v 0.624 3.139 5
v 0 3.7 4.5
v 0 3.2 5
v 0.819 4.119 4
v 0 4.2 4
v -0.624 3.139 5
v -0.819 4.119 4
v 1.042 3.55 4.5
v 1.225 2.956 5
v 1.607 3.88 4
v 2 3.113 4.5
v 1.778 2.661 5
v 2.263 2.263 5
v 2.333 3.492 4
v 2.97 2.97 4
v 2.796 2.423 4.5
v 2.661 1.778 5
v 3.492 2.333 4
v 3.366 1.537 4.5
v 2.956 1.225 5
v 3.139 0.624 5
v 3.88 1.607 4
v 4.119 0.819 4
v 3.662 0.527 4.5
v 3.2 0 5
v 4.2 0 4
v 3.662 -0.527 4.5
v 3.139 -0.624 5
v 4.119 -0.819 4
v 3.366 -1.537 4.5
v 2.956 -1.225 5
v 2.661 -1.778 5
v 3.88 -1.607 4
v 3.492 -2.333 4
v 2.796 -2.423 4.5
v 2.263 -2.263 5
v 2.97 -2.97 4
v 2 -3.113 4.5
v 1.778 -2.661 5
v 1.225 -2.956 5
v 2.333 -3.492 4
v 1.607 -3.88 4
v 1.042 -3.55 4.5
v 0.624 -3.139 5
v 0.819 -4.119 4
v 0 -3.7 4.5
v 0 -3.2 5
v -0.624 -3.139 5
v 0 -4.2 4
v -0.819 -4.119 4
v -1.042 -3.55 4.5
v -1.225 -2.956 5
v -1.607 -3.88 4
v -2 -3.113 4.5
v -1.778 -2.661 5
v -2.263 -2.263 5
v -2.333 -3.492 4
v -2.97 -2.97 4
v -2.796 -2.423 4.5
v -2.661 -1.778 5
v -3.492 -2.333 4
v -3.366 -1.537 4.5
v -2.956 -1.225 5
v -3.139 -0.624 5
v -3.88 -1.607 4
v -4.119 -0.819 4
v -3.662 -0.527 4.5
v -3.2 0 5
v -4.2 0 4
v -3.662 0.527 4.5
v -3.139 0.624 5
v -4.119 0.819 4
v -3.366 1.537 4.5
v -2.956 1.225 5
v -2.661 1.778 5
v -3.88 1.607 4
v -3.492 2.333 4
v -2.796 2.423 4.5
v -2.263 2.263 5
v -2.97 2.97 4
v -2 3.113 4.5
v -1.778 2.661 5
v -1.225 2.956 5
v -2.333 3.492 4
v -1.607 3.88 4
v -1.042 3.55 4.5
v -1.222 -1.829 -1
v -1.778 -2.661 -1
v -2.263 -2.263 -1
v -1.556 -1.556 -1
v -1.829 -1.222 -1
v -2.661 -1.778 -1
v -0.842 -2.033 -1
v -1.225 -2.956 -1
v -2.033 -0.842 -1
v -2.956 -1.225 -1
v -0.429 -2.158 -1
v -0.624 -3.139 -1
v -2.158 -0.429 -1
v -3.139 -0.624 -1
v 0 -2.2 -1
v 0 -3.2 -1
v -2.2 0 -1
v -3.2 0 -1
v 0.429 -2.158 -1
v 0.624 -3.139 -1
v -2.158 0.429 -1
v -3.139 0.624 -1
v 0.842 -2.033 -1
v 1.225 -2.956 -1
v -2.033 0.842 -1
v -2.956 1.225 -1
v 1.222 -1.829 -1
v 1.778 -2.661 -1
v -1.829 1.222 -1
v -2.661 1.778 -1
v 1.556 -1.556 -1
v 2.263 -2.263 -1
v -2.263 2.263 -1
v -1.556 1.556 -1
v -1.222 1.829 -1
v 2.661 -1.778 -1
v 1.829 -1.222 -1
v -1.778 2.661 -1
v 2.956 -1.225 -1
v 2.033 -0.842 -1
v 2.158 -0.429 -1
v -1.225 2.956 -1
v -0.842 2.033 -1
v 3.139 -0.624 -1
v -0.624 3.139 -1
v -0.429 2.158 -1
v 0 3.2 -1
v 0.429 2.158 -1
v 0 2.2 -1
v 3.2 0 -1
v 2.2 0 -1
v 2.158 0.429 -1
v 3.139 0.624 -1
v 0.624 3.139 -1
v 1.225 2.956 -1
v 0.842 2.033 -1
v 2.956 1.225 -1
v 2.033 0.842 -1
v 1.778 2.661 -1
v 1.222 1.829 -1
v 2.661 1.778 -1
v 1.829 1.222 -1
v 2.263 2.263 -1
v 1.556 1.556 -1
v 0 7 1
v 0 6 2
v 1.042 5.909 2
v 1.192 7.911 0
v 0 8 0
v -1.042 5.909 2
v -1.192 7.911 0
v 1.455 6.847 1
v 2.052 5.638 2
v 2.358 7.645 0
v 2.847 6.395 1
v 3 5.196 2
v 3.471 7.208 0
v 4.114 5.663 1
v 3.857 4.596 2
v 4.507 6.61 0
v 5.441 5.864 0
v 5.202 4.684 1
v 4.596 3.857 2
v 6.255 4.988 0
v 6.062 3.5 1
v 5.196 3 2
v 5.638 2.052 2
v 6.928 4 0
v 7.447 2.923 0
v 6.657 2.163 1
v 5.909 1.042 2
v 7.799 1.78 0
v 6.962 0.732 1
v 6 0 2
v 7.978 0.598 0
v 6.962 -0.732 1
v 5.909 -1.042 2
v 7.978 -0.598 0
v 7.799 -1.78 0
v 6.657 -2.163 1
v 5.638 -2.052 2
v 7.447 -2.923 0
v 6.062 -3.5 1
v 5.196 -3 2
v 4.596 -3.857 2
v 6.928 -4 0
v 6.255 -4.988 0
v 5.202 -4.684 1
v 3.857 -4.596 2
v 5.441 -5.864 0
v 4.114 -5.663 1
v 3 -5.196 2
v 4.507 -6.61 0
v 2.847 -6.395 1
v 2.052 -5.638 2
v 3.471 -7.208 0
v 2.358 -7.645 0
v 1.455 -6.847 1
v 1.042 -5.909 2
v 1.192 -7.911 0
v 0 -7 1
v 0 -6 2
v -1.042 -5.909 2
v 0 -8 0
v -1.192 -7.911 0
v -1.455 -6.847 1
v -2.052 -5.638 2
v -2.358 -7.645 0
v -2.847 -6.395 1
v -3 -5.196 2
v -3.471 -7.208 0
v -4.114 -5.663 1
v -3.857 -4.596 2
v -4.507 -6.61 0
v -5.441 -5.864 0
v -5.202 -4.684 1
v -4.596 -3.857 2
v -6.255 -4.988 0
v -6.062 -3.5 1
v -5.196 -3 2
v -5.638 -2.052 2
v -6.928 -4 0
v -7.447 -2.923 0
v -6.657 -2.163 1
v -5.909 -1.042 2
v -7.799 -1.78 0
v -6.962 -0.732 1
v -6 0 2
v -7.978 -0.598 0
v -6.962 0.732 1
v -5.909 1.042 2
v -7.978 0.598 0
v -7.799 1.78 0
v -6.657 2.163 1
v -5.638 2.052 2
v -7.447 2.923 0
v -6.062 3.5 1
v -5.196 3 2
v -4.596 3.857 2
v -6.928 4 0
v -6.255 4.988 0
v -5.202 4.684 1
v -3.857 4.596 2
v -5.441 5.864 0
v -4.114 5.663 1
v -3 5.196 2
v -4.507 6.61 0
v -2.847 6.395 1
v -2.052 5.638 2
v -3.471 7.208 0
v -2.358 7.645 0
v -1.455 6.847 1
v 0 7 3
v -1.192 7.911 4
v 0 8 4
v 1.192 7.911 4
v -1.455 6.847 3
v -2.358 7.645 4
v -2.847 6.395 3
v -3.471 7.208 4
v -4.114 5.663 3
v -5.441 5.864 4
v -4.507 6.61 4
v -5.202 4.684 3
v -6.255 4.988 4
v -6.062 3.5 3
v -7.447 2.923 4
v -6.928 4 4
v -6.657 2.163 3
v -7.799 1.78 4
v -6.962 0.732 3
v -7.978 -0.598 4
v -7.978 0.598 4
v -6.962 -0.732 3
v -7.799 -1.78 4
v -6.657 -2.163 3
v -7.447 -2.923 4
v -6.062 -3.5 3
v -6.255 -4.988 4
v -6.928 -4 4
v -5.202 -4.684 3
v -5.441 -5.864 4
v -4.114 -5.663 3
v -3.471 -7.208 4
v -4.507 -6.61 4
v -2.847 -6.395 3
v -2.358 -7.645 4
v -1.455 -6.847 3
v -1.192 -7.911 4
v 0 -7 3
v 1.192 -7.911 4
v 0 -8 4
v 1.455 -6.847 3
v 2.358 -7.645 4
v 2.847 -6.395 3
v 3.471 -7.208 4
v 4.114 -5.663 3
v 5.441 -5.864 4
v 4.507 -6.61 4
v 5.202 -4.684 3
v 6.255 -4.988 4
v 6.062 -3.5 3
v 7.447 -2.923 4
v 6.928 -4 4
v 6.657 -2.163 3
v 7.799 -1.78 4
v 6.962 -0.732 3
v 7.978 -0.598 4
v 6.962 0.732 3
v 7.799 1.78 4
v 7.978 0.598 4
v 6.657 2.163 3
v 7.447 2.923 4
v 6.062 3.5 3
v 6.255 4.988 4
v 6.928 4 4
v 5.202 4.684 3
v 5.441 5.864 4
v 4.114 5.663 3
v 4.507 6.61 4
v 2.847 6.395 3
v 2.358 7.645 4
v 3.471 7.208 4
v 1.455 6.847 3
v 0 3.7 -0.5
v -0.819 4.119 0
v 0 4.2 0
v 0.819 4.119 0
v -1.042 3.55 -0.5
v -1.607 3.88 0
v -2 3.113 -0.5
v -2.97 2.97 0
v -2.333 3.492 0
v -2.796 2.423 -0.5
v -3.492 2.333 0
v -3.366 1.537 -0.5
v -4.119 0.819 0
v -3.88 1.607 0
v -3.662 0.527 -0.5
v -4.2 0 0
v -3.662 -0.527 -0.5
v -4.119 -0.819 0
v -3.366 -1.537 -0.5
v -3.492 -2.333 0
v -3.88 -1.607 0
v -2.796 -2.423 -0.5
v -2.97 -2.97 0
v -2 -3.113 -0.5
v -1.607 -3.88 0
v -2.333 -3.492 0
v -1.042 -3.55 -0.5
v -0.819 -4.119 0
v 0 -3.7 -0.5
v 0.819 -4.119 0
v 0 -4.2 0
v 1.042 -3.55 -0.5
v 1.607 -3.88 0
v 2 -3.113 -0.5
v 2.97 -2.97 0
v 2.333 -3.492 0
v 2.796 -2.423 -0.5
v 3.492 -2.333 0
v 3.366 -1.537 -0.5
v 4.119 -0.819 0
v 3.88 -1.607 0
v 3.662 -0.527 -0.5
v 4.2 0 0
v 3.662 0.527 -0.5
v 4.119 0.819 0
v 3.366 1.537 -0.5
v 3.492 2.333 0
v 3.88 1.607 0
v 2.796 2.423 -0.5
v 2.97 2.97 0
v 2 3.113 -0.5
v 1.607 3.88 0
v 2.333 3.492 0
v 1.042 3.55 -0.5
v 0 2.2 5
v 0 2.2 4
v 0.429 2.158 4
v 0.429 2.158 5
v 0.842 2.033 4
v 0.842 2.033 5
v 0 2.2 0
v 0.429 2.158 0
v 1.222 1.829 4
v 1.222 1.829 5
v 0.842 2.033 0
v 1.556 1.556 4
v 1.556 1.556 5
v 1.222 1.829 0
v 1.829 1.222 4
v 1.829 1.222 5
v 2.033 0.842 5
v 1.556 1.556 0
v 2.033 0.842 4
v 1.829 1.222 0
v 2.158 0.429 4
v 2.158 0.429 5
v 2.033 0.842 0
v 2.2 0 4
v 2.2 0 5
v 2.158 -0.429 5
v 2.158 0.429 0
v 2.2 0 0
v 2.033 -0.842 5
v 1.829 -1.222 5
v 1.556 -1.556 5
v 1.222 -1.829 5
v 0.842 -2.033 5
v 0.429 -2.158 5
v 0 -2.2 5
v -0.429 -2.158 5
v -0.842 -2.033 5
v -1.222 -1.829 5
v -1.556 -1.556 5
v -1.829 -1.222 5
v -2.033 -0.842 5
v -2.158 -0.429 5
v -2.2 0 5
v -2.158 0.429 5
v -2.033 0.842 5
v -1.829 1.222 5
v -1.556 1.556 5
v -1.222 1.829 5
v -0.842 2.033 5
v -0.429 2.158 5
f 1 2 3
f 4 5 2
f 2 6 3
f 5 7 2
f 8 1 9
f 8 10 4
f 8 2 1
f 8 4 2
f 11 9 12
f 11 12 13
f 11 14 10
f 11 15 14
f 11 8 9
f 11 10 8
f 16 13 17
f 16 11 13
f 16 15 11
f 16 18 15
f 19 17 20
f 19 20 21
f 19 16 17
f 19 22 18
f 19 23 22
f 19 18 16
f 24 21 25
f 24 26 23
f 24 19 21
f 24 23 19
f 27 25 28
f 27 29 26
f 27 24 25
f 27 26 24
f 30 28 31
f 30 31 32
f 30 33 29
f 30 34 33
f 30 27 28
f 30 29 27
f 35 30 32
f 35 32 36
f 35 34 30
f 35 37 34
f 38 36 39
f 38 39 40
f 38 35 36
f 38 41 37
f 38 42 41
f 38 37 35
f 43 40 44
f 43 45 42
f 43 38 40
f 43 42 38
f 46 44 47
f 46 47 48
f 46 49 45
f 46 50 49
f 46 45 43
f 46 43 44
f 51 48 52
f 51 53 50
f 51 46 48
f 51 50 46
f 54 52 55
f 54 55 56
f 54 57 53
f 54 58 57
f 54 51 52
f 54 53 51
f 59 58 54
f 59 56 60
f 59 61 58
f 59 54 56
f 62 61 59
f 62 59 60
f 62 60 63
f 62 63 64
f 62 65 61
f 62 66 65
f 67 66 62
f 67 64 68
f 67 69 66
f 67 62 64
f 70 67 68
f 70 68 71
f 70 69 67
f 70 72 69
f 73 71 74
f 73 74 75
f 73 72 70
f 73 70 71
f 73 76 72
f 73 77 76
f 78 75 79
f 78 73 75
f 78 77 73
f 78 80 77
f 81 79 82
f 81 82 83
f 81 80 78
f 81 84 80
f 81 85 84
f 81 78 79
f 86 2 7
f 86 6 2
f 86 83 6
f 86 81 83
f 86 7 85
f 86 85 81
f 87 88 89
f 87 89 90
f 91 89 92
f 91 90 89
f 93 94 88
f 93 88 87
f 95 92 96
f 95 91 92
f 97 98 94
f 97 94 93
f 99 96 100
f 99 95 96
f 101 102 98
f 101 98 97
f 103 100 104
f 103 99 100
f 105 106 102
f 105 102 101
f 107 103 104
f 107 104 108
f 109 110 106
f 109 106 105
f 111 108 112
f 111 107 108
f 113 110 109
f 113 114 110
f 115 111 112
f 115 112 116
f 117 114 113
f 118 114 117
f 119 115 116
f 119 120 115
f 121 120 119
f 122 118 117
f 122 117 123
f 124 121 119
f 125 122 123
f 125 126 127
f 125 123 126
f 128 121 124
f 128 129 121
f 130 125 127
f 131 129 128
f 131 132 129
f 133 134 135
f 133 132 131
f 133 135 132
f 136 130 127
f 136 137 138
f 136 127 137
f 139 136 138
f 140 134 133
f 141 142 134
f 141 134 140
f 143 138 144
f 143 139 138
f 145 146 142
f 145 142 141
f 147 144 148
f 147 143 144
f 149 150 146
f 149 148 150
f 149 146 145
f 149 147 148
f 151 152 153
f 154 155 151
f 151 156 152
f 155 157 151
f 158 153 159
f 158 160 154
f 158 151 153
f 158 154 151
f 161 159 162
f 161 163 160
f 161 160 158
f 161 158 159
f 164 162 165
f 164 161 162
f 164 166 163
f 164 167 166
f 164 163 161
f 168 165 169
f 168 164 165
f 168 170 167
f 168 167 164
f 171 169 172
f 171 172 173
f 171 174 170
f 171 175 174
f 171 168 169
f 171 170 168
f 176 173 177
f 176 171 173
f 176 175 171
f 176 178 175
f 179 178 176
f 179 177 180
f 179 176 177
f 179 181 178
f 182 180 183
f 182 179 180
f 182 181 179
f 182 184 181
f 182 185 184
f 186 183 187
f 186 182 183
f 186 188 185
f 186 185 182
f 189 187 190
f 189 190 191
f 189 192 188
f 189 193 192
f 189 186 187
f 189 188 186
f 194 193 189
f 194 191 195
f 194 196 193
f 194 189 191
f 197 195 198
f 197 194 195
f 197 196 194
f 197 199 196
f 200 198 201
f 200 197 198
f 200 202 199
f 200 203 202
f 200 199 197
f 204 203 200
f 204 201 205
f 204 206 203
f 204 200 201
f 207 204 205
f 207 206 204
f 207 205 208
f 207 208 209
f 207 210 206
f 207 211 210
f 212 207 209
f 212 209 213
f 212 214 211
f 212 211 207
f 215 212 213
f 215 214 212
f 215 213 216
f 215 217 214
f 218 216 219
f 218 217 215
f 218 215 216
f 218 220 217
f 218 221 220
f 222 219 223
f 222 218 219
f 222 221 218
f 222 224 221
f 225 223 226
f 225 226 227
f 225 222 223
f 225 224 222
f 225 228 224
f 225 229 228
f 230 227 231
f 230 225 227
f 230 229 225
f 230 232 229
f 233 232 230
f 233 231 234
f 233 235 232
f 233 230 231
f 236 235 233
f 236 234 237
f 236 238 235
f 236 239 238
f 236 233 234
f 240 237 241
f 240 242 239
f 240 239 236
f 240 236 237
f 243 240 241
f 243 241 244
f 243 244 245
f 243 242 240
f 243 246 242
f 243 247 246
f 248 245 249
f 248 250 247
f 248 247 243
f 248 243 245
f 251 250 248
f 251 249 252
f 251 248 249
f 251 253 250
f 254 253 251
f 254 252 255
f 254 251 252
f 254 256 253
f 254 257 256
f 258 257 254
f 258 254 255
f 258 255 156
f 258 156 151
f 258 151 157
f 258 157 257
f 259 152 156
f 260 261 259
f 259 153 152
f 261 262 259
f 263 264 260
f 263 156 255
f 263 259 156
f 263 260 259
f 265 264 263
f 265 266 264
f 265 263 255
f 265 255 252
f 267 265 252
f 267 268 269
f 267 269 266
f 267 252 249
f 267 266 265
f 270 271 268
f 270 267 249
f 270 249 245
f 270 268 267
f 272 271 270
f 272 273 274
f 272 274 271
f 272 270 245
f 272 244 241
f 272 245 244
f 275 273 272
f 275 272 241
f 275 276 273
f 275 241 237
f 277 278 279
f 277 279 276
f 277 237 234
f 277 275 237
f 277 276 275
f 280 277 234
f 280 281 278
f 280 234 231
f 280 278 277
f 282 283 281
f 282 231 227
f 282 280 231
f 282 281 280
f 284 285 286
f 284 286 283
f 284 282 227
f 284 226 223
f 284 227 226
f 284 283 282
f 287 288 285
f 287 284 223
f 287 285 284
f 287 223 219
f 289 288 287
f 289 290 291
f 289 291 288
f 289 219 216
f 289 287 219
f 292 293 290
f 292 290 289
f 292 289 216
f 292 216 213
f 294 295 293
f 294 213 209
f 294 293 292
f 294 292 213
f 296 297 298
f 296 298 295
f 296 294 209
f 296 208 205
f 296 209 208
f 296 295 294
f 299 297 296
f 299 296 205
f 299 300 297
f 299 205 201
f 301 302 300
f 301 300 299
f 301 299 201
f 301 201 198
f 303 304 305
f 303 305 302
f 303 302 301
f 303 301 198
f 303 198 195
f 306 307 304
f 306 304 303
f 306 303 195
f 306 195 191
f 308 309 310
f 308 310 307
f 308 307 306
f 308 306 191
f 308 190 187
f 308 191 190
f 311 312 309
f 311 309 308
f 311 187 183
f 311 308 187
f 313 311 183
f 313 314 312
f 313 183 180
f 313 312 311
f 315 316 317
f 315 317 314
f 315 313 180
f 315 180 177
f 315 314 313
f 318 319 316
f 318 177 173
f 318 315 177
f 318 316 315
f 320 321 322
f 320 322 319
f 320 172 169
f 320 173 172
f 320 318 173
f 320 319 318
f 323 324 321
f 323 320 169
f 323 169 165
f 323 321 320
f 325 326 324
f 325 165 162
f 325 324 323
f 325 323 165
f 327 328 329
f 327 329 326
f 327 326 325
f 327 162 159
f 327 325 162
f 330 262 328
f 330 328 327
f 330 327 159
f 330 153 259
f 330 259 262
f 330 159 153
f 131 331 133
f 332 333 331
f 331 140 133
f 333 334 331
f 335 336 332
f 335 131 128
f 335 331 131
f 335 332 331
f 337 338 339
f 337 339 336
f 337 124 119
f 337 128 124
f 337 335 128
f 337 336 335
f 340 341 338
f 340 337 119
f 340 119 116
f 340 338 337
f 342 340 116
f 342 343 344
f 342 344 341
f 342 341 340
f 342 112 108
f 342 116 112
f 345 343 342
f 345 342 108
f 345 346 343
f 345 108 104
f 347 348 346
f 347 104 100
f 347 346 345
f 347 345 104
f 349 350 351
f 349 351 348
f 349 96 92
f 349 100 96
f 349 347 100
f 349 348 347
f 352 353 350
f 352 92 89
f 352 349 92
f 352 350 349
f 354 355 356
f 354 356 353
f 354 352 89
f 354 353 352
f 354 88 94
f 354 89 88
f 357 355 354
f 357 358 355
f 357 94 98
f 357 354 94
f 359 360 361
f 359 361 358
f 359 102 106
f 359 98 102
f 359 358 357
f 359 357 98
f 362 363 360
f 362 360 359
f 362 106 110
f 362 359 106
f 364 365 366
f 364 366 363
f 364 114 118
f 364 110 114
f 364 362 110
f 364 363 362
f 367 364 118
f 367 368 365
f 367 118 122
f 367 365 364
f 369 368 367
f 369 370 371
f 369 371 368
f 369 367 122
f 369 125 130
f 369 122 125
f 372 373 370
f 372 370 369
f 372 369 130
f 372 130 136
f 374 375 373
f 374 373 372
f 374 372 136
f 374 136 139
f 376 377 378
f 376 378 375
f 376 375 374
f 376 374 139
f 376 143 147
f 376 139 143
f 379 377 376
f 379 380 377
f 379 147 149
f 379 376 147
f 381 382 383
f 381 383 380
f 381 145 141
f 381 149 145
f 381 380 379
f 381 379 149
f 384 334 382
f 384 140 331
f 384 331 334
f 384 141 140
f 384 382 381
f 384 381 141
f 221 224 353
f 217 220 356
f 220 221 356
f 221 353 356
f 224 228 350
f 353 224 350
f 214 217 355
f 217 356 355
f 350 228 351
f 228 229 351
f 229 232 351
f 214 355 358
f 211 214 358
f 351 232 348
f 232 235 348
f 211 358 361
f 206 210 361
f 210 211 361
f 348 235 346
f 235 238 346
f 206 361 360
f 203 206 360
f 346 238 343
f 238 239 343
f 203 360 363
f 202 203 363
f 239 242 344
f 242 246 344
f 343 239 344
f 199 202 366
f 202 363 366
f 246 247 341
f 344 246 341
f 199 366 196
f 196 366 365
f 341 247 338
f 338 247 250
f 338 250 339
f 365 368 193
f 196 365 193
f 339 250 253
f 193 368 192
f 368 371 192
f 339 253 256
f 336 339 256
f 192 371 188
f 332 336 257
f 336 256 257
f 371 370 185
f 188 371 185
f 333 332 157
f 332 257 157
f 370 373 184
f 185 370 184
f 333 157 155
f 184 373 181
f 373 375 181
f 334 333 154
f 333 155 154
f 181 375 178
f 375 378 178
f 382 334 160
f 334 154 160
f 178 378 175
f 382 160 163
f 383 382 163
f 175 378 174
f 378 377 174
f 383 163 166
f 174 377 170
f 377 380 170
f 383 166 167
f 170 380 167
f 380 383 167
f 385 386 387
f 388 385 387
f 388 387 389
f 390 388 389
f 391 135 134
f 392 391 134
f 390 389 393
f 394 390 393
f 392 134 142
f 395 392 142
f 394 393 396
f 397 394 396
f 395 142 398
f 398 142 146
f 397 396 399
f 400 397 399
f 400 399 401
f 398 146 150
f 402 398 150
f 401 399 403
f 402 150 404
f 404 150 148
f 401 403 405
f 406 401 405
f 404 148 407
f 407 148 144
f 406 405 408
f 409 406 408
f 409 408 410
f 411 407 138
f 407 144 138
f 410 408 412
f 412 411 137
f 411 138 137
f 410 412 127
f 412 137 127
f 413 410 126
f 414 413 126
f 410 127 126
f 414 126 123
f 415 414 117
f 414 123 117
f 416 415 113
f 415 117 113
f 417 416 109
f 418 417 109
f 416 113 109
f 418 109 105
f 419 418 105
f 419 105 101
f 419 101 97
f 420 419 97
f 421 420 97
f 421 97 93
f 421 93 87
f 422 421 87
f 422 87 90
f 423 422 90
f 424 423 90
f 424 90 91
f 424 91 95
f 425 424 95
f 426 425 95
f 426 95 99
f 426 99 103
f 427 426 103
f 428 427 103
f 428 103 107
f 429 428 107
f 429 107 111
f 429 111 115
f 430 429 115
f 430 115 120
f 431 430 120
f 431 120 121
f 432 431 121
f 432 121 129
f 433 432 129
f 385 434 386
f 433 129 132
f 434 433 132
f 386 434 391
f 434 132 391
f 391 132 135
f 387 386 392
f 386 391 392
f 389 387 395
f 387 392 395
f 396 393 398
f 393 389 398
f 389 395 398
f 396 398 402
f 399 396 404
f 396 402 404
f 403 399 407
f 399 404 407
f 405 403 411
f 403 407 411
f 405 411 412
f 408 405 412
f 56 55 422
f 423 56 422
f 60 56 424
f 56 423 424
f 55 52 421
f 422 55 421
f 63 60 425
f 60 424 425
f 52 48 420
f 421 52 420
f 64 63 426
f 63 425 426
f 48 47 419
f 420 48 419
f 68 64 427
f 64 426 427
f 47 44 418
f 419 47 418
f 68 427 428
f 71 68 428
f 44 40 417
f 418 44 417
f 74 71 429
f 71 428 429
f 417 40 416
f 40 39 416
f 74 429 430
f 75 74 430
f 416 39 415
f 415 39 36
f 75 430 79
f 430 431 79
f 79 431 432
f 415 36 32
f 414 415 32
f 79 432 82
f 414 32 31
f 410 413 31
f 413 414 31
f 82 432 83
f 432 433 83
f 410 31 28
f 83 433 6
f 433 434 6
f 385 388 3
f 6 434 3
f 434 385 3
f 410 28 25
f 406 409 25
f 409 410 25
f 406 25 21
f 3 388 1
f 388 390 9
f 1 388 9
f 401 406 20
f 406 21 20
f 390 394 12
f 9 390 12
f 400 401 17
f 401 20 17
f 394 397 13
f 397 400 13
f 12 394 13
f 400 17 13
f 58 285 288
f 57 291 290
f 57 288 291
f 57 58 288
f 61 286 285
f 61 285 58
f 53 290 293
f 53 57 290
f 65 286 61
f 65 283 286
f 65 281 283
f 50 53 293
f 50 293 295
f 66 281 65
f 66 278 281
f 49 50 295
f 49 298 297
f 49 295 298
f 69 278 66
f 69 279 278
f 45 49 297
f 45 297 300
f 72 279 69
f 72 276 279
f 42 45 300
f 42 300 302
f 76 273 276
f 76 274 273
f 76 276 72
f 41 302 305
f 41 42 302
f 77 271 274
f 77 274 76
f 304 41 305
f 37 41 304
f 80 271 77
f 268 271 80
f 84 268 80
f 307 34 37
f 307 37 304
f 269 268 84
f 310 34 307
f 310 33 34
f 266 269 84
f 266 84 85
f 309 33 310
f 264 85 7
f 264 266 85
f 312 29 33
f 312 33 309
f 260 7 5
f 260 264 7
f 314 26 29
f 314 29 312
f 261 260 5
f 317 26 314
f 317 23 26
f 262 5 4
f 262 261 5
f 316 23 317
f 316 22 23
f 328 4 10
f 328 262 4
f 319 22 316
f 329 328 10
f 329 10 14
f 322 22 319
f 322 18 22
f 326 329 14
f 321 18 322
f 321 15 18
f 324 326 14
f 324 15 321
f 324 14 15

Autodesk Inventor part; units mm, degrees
ref_plane "YZ Plane" through (0, 0, 0) normal (1, 0, 0) x (0, 1, 0)
ref_plane "XZ Plane" through (0, 0, 0) normal (0, 1, 0) x (-1, 0, 0)
ref_plane "XY Plane" through (0, 0, 0) normal (0, 0, 1) x (1, 0, 0)
sketch "Sketch90" plane through (0, 0, 0) normal (0, 0, 1) x (1, 0, 0)
  circle A0 centre (0, 0) radius 2.2
  circle A1 centre (0, 0) radius 6
  dimension "d450" = 4.4
  dimension "d451" = 12
extrude "Extrusion69" add sketch "Sketch90" along normal blind 4
sketch "Sketch91" plane through (0, 0, 0) normal (1, 0, 0) x (0, 1, 0)
  line L0 (6, 0) -> (6, 4) projected
  line L1 (6, 4) -> (8, 4)
  line L2 (6, 0) -> (8, 0)
  line L3 (8, 4) -> (6, 2)
  line L4 (8, 0) -> (6, 2)
  line L5 (0, 0) -> (0, -8)
  line L6 (2.2, 0) -> (-2.2, 0) projected
  line L7 (-6, 0) -> (6, 0) projected
  line L8 (-2.2, 4) -> (2.2, 4) projected
  line L9 (6, 4) -> (-6, 4) projected
  line L10 (-2.2, 4) -> (2.2, 4) projected
  line L11 (2.2, 0) -> (-2.2, 0) projected
  line L12 (2.2, 0) -> (-2.2, 0) projected
  line L13 (2.2, 0) -> (2.2, 4) projected
  line L14 (2.2, 0) -> (4.2, 0)
  line L15 (4.2, 0) -> (4.2, 0)
  line L16 (3.2, -1) -> (2.2, -1)
  line L17 (2.2, -1) -> (2.2, 0)
  line L18 (-2.2, 4) -> (2.2, 4) projected
  line L19 (2.2, 4) -> (4.2, 4)
  line L20 (4.2, 4) -> (4.2, 4)
  line L21 (3.2, 5) -> (2.2, 5)
  line L22 (2.2, 5) -> (2.2, 4)
  line L23 (4.2, 0) -> (3.2, -1)
  line L24 (4.2, 4) -> (3.2, 5)
  point P0 (4.2, -1)
  point P1 (4.2, 5)
  dimension "d454" = 2
  dimension "d456" = 2
  dimension "d457" = 1
  dimension "d458" = 1
  dimension "d459" = 1
  dimension "d460" = 1
  dimension "d461" = 1
  dimension "d462" = 1
revolve "Revolution9" add sketch "Sketch91" angle 360 about axis through (0, 0, 0) along (0, 0, -1) contours L0 L4 L2 | L0 L1 L3 | L23 L16 L17 L7 | L9 L22 L21 L24
properties part number "wheel-4-12"
